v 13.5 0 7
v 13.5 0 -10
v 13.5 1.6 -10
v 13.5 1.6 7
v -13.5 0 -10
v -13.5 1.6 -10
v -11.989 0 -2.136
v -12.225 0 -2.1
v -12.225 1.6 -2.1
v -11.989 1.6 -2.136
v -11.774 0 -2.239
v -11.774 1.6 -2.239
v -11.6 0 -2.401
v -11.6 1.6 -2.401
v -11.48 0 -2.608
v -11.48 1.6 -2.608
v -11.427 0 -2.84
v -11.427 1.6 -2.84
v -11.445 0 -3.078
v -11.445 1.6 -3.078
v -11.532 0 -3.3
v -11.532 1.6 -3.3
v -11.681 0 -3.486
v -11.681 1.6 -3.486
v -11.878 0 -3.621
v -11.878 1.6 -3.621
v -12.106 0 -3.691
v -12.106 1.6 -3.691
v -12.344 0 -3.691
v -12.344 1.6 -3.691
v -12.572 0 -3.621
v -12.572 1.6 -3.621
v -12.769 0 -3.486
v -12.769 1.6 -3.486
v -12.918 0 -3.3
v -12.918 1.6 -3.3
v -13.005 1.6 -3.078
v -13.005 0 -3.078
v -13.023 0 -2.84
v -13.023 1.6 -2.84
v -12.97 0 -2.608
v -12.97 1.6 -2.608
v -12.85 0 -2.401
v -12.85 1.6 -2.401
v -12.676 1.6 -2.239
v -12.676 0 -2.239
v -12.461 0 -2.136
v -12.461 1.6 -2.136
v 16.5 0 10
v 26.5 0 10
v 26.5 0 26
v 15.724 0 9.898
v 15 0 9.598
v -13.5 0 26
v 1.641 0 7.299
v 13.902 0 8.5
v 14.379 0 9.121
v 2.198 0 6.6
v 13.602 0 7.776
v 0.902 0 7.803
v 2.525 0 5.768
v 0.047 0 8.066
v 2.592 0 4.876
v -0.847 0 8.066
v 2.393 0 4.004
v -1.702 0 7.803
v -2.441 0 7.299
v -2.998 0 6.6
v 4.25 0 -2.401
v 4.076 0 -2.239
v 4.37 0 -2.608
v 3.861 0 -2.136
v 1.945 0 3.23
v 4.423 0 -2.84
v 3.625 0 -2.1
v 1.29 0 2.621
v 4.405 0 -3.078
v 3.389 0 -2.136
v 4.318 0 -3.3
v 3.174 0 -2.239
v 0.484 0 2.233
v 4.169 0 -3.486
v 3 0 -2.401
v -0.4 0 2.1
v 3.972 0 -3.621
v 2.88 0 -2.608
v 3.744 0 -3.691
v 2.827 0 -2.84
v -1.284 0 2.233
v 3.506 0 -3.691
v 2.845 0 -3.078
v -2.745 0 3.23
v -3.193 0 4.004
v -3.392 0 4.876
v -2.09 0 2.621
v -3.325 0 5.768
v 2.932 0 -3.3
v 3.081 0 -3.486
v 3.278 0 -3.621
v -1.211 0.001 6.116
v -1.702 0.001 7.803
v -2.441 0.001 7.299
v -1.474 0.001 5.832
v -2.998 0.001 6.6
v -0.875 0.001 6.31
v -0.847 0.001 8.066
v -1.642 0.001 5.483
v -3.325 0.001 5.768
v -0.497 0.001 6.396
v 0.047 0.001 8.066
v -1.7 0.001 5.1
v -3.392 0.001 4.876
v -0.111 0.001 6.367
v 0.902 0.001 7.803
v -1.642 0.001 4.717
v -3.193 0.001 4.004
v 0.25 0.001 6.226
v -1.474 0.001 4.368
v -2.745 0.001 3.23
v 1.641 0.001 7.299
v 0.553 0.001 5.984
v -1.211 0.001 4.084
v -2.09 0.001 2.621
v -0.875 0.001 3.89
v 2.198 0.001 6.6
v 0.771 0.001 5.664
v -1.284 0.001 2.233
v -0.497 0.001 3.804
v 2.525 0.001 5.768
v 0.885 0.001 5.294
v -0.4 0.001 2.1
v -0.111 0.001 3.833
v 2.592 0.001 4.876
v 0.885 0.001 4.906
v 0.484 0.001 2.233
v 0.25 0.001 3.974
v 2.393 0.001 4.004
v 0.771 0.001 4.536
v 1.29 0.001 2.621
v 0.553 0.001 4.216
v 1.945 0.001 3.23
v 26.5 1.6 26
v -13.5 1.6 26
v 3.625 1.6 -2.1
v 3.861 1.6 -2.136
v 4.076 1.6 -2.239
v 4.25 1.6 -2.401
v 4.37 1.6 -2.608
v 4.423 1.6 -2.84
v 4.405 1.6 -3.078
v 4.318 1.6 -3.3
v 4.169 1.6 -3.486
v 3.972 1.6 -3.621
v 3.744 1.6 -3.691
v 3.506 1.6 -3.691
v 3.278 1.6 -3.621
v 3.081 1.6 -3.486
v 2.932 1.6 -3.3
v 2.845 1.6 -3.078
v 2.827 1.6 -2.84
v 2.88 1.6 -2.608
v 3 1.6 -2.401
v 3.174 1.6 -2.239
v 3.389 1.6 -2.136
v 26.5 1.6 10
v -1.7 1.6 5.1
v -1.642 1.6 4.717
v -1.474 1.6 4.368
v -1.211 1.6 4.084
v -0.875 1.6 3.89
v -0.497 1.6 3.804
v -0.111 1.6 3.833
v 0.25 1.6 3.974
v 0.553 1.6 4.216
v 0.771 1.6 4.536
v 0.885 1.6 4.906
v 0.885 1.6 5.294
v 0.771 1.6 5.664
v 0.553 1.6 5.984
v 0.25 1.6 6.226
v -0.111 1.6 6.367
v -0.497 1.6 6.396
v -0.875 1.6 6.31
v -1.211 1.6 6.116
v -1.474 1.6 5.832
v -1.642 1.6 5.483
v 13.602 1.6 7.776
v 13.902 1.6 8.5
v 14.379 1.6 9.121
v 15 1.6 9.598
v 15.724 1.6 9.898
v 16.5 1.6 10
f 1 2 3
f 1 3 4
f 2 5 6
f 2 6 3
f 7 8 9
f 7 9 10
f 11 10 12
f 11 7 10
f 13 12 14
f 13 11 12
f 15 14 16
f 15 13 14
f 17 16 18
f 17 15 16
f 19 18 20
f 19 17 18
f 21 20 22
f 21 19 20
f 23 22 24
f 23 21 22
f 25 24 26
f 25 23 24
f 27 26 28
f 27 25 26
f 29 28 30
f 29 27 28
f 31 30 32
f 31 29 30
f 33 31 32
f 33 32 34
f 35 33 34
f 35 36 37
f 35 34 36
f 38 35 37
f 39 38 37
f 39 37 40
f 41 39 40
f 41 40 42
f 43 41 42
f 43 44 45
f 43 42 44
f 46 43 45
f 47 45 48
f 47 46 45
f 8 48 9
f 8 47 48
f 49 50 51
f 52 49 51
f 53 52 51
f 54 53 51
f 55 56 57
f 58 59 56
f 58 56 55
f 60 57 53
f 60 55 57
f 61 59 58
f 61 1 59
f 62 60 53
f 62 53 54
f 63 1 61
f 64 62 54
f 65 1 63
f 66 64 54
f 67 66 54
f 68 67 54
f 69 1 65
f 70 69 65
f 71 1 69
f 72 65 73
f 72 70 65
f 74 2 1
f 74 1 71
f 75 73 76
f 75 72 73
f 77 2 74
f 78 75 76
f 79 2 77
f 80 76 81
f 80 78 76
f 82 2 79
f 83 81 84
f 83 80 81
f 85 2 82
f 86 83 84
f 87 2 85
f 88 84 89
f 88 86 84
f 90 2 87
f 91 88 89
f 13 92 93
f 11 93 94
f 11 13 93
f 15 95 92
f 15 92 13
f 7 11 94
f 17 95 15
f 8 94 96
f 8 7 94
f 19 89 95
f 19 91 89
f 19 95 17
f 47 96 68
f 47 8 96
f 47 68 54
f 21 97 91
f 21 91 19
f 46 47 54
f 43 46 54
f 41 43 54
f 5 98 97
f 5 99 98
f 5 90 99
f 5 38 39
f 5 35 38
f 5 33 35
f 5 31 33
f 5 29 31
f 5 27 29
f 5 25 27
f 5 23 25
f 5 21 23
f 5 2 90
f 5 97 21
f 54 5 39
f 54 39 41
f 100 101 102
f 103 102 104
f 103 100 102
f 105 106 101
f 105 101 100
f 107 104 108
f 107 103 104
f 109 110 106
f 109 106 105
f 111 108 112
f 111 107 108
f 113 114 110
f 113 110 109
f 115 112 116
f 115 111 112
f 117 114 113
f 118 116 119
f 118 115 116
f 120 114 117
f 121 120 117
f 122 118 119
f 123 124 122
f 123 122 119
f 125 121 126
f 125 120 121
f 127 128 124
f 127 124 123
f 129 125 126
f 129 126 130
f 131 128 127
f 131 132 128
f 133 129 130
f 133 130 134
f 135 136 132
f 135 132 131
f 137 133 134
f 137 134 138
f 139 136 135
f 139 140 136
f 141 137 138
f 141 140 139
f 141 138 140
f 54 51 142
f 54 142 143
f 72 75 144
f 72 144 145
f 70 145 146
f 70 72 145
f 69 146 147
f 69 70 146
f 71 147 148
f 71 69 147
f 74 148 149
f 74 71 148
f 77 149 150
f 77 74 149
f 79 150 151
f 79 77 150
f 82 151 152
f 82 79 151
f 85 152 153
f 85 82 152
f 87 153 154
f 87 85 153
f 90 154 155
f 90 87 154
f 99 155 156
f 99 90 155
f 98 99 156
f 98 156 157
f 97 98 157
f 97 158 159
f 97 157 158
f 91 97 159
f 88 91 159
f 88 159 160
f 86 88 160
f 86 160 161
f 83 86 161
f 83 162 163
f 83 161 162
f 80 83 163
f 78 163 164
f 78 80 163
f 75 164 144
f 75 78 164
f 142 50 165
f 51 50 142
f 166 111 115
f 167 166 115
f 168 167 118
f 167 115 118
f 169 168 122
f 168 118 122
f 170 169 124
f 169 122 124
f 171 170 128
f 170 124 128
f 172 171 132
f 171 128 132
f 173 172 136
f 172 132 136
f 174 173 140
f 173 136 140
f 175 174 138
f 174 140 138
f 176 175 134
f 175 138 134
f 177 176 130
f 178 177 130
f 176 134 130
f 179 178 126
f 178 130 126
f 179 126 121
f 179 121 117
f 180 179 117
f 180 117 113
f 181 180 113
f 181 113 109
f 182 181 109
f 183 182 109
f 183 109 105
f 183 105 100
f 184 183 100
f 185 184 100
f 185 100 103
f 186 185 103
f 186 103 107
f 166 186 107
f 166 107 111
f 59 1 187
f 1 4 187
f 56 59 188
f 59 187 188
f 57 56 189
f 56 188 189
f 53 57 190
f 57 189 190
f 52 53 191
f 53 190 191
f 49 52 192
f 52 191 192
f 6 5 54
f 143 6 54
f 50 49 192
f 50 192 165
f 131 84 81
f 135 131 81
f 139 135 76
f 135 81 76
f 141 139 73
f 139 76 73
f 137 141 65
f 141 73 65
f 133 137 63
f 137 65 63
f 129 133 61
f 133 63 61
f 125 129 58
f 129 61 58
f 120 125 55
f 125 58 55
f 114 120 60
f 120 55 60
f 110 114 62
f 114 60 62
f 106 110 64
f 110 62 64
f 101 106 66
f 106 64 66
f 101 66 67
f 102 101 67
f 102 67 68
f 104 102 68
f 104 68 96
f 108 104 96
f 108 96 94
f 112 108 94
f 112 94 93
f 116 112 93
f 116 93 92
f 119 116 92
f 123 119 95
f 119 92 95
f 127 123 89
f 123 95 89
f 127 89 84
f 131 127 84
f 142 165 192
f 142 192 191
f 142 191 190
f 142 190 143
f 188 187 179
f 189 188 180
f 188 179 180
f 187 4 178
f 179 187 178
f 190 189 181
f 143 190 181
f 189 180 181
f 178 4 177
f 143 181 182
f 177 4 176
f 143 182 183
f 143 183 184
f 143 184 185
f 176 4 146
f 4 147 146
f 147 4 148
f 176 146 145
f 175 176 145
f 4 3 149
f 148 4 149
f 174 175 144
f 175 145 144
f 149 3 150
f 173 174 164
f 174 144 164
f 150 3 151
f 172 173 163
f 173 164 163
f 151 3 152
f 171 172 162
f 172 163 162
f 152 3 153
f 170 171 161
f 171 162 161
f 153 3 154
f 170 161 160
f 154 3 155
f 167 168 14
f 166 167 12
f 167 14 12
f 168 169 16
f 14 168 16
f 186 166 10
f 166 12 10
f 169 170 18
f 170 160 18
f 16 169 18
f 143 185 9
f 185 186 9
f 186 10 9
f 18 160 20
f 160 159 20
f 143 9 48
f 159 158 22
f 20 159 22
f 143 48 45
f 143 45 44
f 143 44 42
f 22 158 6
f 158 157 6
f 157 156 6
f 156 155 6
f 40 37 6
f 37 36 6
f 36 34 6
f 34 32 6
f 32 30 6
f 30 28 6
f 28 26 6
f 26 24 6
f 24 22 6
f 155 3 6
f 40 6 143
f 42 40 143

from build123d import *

# Parameters (mm, degrees)
BOSS_EXTRUDE1_DEPTH     = 1.6
FILLET1_R               = 3
M2_CLEARANCE_HOLE1_D    = 2.6
CUT_EXTRUDE1_DEPTH      = 38.159251876
CUT_EXTRUDE1_DEPTH_BACK = 38.159251876
SKETCH5_R               = 0.8
SKETCH6_R               = 3
CUT_EXTRUDE2_DEPTH      = 0.001


with BuildPart() as part:
    # Sketch1 → Boss-Extrude1 (new body)
    with BuildSketch(Plane(origin=(0, 0, 0), x_dir=(1, 0, 0), z_dir=(0, 1, 0))):
        Polygon((-13.5, -10), (-13.5, 10), (13.5, 10), (13.5, -10), (26.5, -10), (26.5, -26), (-13.5, -26), align=None)
    extrude(amount=BOSS_EXTRUDE1_DEPTH)

    # Fillet1
    fillet1_edges = [part.edges().sort_by_distance(p)[0] for p in [
        (13.5, 0.8, 10),
    ]]
    fillet(fillet1_edges, radius=FILLET1_R)

    # M2 Clearance Hole1 (through all)
    with Locations(Plane(origin=(0, 1.6, 0), x_dir=(1, 0, 0), z_dir=(0, 1, 0))):
        with Locations((-0.4, -5.1)):
            Hole(M2_CLEARANCE_HOLE1_D / 2)

    # Sketch5 → Cut-Extrude1 (cut, two sides: drawn at the far end of the back side and taken through both)
    with BuildSketch(Plane(origin=(0, 1.6, 0), x_dir=(1, 0, 0), z_dir=(0, 1, 0)).offset(-CUT_EXTRUDE1_DEPTH_BACK)):
        with Locations(Location((-12.225, 2.9, 0), (0, 0, 270))):
            Circle(SKETCH5_R)
        with Locations(Location((3.625, 2.9, 0), (0, 0, 270))):
            Circle(SKETCH5_R)
    extrude(amount=CUT_EXTRUDE1_DEPTH + CUT_EXTRUDE1_DEPTH_BACK, mode=Mode.SUBTRACT)

    # Sketch6 → Cut-Extrude2 (cut)
    with BuildSketch(Plane.XZ):
        with Locations(Location((-0.4, 5.1, 0), (0, 0, 270))):
            Circle(SKETCH6_R)
    extrude(amount=-CUT_EXTRUDE2_DEPTH, mode=Mode.SUBTRACT)


solid = part.part
